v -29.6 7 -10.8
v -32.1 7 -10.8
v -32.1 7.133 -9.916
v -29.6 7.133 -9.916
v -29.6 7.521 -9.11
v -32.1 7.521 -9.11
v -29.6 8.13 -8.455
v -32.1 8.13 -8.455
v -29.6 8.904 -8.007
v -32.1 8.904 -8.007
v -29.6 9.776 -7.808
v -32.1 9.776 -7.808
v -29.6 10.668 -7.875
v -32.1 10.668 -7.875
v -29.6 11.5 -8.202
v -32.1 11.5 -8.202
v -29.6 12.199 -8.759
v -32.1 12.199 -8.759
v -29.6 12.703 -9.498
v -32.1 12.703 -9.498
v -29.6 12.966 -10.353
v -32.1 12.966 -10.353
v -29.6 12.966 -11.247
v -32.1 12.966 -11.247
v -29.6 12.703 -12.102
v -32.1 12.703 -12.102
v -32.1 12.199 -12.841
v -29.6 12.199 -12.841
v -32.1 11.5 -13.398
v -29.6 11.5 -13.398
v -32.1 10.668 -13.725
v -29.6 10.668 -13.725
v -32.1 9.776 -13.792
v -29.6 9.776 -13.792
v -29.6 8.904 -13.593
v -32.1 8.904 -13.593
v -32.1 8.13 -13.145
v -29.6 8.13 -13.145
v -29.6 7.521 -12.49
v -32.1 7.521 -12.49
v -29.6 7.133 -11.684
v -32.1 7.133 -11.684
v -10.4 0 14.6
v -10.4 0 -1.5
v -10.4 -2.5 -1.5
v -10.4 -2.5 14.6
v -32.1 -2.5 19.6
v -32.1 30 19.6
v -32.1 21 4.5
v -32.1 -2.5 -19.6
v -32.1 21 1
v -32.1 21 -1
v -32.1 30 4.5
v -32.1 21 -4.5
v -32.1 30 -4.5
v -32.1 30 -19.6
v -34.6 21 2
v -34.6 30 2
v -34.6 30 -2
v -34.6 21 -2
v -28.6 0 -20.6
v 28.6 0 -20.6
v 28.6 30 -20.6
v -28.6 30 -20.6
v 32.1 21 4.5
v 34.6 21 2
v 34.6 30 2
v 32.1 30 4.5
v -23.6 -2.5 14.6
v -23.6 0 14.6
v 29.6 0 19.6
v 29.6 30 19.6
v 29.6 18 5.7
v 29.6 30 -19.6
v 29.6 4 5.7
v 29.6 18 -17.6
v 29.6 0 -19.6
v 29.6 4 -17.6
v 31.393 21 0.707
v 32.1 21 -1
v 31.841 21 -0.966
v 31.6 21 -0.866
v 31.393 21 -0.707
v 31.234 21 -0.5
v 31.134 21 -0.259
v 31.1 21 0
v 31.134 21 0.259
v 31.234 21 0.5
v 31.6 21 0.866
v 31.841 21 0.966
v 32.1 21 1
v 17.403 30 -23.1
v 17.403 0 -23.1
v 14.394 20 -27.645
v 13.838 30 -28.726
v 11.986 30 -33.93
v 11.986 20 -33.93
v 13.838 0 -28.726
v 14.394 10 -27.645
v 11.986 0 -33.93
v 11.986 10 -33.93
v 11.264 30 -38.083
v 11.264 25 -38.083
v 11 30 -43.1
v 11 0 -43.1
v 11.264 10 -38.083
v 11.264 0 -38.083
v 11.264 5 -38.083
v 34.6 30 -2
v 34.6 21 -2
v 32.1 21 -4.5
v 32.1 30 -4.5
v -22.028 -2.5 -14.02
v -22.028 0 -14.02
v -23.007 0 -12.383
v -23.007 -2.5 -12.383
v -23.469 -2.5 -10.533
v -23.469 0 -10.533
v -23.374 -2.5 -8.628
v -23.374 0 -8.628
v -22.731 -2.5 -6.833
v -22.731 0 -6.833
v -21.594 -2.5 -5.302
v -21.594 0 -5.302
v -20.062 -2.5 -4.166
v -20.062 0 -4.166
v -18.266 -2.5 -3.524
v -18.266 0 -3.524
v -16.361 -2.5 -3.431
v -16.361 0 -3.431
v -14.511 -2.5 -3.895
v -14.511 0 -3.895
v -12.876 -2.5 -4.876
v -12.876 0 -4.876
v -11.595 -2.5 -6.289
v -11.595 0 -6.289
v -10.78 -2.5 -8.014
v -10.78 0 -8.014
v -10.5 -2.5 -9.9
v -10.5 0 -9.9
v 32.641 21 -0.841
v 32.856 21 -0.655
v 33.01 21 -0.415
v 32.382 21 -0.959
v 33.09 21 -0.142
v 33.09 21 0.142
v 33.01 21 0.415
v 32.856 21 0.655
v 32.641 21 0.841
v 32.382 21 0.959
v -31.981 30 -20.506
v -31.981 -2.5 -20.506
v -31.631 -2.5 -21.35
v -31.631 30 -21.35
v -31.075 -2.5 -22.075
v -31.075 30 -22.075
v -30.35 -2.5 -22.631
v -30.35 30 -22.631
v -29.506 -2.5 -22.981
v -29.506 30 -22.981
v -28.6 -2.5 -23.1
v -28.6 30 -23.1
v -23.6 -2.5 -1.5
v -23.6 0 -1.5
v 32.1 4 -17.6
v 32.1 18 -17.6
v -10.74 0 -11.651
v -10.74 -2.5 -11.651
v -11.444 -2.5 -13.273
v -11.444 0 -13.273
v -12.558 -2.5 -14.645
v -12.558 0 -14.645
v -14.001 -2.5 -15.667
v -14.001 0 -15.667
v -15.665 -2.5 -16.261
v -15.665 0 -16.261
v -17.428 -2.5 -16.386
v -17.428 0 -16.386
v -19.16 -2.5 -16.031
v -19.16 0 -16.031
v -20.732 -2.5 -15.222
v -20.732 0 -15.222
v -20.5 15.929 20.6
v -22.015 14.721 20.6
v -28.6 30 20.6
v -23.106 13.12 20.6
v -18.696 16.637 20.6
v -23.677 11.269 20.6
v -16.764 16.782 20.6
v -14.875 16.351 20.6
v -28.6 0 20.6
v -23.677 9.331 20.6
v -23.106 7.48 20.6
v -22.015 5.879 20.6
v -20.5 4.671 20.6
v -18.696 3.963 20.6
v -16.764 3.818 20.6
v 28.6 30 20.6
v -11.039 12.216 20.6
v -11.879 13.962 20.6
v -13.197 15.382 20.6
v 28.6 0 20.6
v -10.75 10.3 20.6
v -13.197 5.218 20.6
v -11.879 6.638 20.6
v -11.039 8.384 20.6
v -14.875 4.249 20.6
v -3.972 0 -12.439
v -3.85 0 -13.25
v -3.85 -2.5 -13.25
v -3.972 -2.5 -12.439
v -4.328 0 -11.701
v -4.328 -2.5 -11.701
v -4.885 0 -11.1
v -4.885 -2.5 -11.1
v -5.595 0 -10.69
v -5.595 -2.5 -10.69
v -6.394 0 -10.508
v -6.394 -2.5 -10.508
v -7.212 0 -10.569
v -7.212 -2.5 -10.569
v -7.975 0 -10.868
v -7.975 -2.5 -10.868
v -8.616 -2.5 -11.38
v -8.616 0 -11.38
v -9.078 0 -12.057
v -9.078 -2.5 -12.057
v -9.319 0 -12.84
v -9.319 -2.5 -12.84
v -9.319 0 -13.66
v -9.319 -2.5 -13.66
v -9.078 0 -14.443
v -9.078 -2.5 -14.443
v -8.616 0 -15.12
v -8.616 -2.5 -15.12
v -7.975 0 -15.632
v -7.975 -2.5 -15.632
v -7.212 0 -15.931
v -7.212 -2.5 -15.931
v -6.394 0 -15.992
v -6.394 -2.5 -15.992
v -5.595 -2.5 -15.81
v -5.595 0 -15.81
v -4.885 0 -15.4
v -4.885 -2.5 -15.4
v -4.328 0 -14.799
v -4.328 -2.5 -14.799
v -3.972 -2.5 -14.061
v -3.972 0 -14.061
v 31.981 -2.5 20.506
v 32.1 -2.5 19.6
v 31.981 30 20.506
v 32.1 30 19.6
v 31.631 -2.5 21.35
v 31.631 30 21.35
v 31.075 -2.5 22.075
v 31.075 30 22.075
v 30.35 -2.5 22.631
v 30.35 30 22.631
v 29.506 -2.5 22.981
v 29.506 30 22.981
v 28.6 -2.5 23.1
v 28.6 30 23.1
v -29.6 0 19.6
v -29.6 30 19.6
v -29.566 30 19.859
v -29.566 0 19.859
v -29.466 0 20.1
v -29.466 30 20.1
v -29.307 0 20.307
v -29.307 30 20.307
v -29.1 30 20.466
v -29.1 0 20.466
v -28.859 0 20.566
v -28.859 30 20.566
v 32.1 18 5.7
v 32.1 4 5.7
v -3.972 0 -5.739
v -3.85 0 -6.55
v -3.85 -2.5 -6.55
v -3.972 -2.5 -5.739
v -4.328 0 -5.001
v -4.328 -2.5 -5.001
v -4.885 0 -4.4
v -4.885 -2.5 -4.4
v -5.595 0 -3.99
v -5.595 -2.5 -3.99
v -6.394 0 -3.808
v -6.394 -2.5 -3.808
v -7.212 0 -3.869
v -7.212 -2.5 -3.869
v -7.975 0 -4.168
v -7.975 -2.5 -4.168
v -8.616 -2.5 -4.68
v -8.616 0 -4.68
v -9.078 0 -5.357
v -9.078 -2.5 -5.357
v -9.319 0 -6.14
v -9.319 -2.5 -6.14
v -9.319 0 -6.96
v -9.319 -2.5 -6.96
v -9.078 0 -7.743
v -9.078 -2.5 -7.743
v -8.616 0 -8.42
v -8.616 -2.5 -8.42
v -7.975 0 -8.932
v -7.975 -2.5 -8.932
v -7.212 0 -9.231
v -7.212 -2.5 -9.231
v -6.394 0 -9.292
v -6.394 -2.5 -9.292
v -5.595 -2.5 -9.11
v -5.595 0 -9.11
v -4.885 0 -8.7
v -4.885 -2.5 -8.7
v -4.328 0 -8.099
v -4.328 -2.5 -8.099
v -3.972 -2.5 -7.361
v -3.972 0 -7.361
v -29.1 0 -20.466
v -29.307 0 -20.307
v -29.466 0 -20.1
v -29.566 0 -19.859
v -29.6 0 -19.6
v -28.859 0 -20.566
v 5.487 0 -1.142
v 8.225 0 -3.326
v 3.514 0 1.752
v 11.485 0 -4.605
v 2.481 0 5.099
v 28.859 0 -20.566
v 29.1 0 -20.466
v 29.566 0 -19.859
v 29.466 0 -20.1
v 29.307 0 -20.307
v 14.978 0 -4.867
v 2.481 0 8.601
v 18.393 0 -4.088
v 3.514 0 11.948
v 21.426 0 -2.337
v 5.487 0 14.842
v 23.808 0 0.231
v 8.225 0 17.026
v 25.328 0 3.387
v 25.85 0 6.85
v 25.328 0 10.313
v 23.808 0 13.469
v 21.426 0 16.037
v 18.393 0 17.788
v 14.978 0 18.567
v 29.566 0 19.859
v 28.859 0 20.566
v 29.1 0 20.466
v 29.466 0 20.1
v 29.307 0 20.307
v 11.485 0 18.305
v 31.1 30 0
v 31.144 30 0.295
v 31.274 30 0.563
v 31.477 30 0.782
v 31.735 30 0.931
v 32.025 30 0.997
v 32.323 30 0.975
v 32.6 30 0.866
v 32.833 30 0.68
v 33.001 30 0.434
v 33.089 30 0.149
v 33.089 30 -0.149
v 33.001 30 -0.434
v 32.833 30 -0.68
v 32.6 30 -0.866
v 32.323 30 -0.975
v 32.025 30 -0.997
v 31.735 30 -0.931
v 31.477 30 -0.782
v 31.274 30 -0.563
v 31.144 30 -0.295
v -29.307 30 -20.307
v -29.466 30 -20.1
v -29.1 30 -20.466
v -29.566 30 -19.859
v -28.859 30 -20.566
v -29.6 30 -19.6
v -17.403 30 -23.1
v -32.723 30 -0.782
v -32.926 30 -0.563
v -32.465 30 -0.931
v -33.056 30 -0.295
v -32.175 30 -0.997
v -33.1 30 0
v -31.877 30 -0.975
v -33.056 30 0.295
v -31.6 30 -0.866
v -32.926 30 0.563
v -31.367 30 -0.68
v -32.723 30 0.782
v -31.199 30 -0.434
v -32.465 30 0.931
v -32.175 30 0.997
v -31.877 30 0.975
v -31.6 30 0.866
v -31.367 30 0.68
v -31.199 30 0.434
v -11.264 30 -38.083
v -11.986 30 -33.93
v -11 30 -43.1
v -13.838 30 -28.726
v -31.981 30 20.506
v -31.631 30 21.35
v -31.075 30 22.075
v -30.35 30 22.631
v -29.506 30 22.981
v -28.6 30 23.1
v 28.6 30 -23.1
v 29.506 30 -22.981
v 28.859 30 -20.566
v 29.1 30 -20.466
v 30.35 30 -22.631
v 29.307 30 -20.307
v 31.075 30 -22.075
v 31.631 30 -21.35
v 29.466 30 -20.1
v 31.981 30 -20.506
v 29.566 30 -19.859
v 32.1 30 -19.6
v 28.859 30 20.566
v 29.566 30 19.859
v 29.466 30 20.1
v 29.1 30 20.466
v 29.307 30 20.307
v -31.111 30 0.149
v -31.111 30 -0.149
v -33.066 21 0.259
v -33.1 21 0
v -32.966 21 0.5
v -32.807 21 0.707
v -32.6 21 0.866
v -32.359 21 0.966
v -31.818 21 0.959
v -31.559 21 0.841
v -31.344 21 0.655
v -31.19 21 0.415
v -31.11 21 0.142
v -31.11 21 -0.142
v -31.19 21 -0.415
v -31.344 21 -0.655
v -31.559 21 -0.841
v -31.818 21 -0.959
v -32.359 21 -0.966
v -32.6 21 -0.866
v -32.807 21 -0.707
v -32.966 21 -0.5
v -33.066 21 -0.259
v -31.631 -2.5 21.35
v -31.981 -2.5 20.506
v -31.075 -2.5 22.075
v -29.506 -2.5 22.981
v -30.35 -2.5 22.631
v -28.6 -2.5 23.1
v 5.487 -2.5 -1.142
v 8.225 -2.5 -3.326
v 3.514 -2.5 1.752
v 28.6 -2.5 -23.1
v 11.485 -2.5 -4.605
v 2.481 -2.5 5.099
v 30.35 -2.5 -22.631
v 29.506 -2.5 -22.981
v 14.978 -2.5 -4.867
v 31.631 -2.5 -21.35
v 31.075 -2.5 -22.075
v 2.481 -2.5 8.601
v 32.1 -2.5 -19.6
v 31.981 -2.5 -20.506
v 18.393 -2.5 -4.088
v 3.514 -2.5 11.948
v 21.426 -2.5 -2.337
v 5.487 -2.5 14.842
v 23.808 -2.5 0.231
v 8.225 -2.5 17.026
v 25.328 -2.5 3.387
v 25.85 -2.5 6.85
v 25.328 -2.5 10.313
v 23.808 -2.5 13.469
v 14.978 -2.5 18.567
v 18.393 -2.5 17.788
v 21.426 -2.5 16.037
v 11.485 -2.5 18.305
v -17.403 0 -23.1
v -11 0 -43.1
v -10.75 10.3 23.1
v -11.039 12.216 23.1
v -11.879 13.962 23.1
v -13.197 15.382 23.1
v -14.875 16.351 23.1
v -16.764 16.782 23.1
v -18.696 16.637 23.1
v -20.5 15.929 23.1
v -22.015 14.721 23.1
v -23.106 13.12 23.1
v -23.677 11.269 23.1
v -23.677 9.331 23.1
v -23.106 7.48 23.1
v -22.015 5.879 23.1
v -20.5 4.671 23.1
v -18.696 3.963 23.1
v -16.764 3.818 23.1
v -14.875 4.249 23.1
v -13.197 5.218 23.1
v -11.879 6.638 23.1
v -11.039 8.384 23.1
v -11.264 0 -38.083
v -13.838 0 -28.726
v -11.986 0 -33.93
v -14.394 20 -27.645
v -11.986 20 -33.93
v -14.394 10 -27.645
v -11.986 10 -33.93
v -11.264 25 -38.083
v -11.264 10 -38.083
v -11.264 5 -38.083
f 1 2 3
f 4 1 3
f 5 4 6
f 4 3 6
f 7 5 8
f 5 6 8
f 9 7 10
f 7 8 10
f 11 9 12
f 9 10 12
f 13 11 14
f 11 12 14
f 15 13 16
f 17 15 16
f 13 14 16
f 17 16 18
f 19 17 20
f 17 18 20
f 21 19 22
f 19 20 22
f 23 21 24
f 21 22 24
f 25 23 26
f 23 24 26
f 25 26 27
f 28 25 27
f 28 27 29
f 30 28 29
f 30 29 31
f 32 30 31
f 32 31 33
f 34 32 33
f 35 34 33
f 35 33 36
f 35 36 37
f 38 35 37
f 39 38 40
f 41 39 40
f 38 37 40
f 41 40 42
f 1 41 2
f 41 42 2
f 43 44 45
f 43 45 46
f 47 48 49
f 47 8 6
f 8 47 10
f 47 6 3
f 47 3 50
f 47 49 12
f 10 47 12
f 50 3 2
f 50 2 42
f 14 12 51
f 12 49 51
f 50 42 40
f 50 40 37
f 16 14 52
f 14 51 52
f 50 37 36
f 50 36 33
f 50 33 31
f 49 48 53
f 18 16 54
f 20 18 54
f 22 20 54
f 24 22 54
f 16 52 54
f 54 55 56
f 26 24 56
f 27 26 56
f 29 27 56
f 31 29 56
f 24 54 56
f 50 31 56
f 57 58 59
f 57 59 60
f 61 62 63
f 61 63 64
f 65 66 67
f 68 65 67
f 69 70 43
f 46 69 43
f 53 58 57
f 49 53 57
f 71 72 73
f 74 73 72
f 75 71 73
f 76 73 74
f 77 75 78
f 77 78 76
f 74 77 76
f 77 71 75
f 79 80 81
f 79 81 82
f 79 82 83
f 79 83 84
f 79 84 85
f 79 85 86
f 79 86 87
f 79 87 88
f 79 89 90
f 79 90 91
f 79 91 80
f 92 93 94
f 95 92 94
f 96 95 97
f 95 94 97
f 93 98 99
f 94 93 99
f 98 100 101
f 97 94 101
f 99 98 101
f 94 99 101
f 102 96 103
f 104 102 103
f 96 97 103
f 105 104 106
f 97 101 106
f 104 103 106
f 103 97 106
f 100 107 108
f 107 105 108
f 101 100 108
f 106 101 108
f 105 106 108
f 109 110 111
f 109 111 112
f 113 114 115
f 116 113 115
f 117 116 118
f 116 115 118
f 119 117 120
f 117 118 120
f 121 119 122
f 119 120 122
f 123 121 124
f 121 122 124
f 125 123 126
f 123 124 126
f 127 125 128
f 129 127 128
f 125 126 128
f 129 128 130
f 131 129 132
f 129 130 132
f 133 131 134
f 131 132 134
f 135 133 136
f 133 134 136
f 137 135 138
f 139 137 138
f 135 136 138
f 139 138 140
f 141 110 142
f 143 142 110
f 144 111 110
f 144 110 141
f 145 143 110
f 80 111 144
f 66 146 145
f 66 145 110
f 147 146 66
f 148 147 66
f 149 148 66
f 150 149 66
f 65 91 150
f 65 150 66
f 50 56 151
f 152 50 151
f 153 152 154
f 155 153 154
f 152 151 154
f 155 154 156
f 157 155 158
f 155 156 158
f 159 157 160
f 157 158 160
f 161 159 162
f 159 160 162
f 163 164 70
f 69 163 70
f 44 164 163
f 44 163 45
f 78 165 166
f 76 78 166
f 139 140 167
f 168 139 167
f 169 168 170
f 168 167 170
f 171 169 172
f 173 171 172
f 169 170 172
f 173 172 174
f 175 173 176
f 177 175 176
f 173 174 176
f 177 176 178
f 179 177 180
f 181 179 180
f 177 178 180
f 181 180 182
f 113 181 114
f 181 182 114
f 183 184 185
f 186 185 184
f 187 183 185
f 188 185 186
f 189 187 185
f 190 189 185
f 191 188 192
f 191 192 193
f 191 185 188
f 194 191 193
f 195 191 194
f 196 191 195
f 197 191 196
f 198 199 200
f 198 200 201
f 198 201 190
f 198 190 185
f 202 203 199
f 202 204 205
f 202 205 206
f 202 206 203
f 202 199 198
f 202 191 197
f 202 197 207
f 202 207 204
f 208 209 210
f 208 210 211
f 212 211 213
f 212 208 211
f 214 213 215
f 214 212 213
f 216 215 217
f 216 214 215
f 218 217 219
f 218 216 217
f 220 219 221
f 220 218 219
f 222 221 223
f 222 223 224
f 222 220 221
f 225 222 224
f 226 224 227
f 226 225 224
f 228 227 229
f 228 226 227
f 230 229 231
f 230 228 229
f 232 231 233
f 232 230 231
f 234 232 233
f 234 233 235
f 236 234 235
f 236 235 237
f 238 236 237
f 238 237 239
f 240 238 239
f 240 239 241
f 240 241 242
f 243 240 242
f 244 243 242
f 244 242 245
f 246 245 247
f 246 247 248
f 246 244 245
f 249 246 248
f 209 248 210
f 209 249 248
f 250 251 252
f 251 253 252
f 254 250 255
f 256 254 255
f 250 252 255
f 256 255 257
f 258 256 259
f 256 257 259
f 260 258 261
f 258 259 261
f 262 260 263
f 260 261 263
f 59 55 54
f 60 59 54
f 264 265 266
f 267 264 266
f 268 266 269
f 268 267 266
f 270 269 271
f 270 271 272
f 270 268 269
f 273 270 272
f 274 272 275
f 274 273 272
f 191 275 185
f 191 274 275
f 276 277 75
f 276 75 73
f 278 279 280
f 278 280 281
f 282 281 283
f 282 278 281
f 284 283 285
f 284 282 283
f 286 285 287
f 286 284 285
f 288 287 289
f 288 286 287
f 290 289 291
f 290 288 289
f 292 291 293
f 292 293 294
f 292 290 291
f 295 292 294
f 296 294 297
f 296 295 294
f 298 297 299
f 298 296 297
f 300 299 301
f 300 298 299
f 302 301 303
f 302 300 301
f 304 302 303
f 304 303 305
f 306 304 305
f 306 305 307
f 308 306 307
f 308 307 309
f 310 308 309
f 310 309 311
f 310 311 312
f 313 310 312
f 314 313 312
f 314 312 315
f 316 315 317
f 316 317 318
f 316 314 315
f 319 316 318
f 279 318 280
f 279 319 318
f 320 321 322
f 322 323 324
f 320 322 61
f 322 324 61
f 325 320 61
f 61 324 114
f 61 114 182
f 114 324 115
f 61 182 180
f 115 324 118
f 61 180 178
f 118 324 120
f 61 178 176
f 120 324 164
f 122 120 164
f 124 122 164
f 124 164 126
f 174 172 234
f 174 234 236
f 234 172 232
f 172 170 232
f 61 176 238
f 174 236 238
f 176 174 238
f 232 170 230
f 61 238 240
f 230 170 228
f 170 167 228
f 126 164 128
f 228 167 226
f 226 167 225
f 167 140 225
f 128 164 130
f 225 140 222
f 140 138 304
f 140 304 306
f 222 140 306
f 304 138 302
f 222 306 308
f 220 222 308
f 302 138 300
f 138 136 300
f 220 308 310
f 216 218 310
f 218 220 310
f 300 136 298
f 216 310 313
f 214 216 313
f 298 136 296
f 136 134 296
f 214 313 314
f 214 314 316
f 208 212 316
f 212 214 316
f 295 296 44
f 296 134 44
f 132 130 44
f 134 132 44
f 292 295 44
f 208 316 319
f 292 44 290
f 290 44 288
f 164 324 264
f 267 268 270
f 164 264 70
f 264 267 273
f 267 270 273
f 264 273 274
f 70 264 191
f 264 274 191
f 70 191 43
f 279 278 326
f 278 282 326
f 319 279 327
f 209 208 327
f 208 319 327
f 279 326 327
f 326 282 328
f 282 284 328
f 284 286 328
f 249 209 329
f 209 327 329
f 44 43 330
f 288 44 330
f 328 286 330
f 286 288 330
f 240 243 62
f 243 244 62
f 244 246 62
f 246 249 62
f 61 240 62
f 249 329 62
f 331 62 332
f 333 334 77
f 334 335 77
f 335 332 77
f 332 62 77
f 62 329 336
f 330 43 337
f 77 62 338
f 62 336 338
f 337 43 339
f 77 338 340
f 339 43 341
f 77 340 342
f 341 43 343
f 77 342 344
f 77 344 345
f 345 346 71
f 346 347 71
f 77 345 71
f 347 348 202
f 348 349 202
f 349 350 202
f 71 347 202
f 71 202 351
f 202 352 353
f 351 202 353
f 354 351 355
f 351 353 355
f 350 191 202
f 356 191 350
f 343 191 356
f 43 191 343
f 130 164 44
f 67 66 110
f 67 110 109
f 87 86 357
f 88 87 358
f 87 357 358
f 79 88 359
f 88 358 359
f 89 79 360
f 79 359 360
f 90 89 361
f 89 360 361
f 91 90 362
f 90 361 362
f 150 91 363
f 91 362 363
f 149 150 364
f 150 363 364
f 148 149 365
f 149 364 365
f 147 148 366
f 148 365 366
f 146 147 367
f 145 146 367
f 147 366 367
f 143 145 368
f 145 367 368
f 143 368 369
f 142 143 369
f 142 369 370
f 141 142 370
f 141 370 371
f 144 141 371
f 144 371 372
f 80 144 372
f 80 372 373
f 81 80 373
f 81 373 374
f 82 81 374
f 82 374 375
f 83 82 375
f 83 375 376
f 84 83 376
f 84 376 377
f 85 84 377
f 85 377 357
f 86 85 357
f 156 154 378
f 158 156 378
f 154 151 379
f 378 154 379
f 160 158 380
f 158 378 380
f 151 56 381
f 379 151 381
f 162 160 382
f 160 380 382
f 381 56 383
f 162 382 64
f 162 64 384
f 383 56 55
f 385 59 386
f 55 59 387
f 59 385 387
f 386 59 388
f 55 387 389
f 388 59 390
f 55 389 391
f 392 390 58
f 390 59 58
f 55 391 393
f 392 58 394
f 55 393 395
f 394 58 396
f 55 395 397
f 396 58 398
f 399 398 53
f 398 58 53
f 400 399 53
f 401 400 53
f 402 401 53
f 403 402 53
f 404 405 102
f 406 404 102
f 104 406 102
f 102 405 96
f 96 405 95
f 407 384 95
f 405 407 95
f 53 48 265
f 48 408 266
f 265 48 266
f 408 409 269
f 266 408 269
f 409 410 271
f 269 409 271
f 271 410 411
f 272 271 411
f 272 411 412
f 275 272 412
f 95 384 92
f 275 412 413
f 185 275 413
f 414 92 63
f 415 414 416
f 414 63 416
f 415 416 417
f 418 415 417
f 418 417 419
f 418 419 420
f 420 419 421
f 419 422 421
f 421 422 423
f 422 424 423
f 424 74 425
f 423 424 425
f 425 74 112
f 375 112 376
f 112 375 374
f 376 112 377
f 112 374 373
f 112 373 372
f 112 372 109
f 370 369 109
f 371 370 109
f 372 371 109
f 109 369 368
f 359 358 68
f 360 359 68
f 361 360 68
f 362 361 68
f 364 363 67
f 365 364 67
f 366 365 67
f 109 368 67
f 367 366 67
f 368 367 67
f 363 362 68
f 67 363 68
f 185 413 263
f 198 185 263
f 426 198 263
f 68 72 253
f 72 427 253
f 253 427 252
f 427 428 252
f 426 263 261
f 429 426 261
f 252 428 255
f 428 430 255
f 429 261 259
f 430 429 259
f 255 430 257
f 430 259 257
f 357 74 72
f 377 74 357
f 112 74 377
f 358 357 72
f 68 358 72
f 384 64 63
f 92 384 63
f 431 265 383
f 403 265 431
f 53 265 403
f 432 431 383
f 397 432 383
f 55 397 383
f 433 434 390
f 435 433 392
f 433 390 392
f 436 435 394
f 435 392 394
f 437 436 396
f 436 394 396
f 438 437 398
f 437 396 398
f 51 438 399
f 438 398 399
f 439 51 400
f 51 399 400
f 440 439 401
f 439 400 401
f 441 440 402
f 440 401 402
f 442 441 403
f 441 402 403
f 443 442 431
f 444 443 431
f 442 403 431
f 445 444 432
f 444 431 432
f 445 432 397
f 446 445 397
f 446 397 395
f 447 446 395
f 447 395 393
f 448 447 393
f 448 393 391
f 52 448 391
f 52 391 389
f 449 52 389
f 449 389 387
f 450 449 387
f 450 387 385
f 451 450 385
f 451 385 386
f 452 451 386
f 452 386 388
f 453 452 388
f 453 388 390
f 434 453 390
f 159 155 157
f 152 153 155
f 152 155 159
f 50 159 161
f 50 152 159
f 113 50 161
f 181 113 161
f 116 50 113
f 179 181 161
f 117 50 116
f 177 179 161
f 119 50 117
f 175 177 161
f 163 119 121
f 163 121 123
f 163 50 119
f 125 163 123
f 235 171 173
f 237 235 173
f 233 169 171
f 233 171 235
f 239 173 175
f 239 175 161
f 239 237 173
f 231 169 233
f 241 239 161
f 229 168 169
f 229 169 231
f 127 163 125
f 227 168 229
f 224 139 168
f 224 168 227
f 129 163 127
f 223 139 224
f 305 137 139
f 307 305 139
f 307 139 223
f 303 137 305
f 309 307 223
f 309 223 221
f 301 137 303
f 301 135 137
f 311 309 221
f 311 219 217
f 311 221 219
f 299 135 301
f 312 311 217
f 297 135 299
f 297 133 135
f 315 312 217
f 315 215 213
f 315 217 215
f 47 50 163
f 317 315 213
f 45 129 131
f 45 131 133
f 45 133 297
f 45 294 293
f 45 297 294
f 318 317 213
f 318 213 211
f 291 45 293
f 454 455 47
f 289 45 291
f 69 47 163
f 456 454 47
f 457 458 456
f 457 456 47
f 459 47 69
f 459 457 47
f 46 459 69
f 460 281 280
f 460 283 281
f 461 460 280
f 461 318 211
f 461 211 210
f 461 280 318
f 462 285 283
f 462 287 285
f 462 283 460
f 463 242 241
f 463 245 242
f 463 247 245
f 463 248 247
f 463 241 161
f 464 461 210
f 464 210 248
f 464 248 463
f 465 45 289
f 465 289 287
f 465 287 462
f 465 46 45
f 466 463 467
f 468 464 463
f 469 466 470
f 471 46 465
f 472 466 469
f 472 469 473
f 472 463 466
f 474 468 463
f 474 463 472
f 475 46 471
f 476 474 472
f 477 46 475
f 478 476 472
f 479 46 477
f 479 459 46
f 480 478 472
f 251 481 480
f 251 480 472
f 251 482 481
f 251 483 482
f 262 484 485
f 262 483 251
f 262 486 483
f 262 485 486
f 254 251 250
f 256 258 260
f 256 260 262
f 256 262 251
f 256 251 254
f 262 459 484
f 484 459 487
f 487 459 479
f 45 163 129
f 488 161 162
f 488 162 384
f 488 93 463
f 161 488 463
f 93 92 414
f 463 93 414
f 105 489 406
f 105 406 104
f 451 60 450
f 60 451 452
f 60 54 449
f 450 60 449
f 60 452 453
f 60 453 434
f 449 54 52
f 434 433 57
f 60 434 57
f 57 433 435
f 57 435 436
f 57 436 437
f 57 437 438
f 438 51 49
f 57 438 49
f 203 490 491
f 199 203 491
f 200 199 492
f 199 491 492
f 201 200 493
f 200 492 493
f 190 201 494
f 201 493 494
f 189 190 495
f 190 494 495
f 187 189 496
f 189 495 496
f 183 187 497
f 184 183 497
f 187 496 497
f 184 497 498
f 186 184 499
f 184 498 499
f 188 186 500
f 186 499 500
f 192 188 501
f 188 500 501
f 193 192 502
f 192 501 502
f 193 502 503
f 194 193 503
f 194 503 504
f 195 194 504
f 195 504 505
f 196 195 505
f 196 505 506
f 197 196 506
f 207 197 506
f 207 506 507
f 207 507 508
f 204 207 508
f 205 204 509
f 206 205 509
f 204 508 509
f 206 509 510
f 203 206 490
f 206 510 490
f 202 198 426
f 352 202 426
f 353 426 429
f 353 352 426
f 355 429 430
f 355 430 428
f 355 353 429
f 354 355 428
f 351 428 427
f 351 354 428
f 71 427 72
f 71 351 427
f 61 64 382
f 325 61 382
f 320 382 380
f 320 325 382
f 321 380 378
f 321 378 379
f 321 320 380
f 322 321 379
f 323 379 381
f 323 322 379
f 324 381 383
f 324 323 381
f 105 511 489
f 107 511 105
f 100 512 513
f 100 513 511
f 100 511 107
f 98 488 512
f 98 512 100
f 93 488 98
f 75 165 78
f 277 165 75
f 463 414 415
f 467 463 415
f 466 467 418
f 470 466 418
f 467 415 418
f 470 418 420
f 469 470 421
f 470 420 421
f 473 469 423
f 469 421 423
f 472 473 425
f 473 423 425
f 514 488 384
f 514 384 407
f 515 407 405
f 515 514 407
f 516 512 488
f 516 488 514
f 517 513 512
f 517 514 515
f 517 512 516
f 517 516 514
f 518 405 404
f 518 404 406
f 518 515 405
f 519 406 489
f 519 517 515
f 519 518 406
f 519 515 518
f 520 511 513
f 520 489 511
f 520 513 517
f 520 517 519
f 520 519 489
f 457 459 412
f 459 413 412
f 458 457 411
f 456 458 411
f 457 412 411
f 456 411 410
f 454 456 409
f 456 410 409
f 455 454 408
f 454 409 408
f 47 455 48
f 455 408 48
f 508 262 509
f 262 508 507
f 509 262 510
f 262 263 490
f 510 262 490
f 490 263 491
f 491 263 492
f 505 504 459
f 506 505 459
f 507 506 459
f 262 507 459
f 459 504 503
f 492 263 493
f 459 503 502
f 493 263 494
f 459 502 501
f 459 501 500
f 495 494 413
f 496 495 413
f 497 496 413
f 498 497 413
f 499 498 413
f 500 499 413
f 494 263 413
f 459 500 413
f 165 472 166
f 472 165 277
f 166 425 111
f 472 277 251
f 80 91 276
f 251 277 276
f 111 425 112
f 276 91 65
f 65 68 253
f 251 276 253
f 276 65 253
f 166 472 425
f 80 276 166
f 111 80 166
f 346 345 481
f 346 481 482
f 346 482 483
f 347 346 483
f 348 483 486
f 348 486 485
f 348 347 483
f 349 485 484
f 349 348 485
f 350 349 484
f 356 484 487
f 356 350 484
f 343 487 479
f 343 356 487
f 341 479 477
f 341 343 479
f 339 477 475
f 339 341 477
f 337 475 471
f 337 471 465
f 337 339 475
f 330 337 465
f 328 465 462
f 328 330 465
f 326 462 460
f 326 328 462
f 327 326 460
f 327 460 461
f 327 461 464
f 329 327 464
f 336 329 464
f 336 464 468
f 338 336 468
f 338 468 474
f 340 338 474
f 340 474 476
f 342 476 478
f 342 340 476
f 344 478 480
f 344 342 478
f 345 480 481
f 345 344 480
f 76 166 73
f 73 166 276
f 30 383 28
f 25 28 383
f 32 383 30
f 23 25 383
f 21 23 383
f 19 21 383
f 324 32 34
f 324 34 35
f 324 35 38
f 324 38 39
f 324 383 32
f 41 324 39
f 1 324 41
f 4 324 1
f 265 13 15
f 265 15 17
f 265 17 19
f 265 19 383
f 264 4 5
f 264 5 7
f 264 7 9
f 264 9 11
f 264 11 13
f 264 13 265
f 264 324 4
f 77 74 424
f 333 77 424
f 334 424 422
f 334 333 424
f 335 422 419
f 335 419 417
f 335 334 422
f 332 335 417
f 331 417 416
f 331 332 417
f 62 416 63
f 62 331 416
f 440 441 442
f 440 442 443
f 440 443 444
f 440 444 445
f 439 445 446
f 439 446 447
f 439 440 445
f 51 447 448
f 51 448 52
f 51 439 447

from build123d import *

# Parameters (mm, degrees)
F1_DEPTH  = 30
F0_R      = 2.75
F0_W      = 13.2
F0_H      = 16.1
F0_R_2    = 11.75
F2_DEPTH  = 2.5
F3_R      = 6.5
F4_DEPTH  = 2.5
F5_R      = 3
F6_DEPTH  = 2.5
F7_W      = 14
F7_H      = 23.3
F8_DEPTH  = 2.5
F5_W      = 9
F5_H      = 9
F9_DEPTH  = 2.5
F7_W_2    = 9
F7_H_2    = 9
F10_DEPTH = 2.5
F11_SIZE  = 2.49999
F12_R     = 1
F13_DEPTH = 9


# Not quite as in the source:
# - a fillet or chamfer is up to 0.001 mm smaller than in the source, because OpenCascade refuses the exact size


with BuildPart() as f1:
    # F0 (on Front) → F1 (new body)
    with BuildSketch(Plane.XZ):
        with BuildLine():
            Line((-28.6, 20.6), (28.6, 20.6))
            ThreePointArc((28.6, 20.6), (29.3071067812, 20.3071067812), (29.6, 19.6))
            Line((29.6, 19.6), (29.6, -19.6))
            ThreePointArc((29.6, -19.6), (29.3071067812, -20.3071067812), (28.6, -20.6))
            Line((28.6, -20.6), (19.2463447419, -20.6))
            add(Edge.make_bspline(
                [(19.2463447419, -20.6), (18.6700440776, -21.4257741259), (18.043869698, -22.2429184725), (17.402758481, -23.1)],
                knots=[11.0100107819, 11.0100107819, 11.0100107819, 11.0100107819, 14.8362531821, 14.8362531821, 14.8362531821, 14.8362531821], degree=3))
            Line((17.402758481, -23.1), (28.6, -23.1))
            ThreePointArc((28.6, -23.1), (31.0748737342, -22.0748737342), (32.1, -19.6))
            Line((32.1, -19.6), (32.1, 19.6))
            ThreePointArc((32.1, 19.6), (31.0748737342, 22.0748737342), (28.6, 23.1))
            Line((28.6, 23.1), (-28.6, 23.1))
            ThreePointArc((-28.6, 23.1), (-31.0748737342, 22.0748737342), (-32.1, 19.6))
            Line((-32.1, 19.6), (-32.1, -19.6))
            ThreePointArc((-32.1, -19.6), (-31.0748737342, -22.0748737342), (-28.6, -23.1))
            Line((-28.6, -23.1), (-17.402758481, -23.1))
            add(Edge.make_bspline(
                [(-19.2463447419, -20.6), (-18.6700440776, -21.4257741259), (-18.043869698, -22.2429184725), (-17.402758481, -23.1)],
                knots=[11.0100107819, 11.0100107819, 11.0100107819, 11.0100107819, 14.8362531821, 14.8362531821, 14.8362531821, 14.8362531821], degree=3))
            Line((-19.2463447419, -20.6), (-28.6, -20.6))
            ThreePointArc((-28.6, -20.6), (-29.3071067812, -20.3071067812), (-29.6, -19.6))
            Line((-29.6, -19.6), (-29.6, 19.6))
            ThreePointArc((-29.6, 19.6), (-29.3071067812, 20.3071067812), (-28.6, 20.6))
        make_face()
        with BuildLine():
            add(Edge.make_bspline(
                [(19.2463447419, -20.6), (18.6700440776, -21.4257741259), (18.043869698, -22.2429184725), (17.402758481, -23.1)],
                knots=[11.0100107819, 11.0100107819, 11.0100107819, 11.0100107819, 14.8362531821, 14.8362531821, 14.8362531821, 14.8362531821], degree=3))
            Line((19.2463447419, -20.6), (-19.2463447419, -20.6))
            add(Edge.make_bspline(
                [(-19.2463447419, -20.6), (-18.6700440776, -21.4257741259), (-18.043869698, -22.2429184725), (-17.402758481, -23.1)],
                knots=[11.0100107819, 11.0100107819, 11.0100107819, 11.0100107819, 14.8362531821, 14.8362531821, 14.8362531821, 14.8362531821], degree=3))
            Line((-17.402758481, -23.1), (17.402758481, -23.1))
        make_face()
        with BuildLine():
            add(Edge.make_bspline(
                [(17.402758481, -23.1), (14.3686514172, -27.1562028058), (11, -32.1068893696), (11, -43.1)],
                knots=[14.8362531821, 14.8362531821, 14.8362531821, 14.8362531821, 32.9442331828, 32.9442331828, 32.9442331828, 32.9442331828], degree=3))
            Line((17.402758481, -23.1), (-17.402758481, -23.1))
            add(Edge.make_bspline(
                [(-17.402758481, -23.1), (-14.3686514172, -27.1562028058), (-11, -32.1068893696), (-11, -43.1)],
                knots=[14.8362531821, 14.8362531821, 14.8362531821, 14.8362531821, 32.9442331828, 32.9442331828, 32.9442331828, 32.9442331828], degree=3))
            Line((-11, -43.1), (11, -43.1))
        make_face()
    extrude(amount=-F1_DEPTH)

    # F0 (on Front) → F2 (join)
    with BuildSketch(Plane.XZ):
        with BuildLine():
            Line((-28.6, 20.6), (28.6, 20.6))
            ThreePointArc((28.6, 20.6), (29.3071067812, 20.3071067812), (29.6, 19.6))
            Line((29.6, 19.6), (29.6, -19.6))
            ThreePointArc((29.6, -19.6), (29.3071067812, -20.3071067812), (28.6, -20.6))
            Line((28.6, -20.6), (19.2463447419, -20.6))
            add(Edge.make_bspline(
                [(19.2463447419, -20.6), (18.6700440776, -21.4257741259), (18.043869698, -22.2429184725), (17.402758481, -23.1)],
                knots=[11.0100107819, 11.0100107819, 11.0100107819, 11.0100107819, 14.8362531821, 14.8362531821, 14.8362531821, 14.8362531821], degree=3))
            Line((17.402758481, -23.1), (28.6, -23.1))
            ThreePointArc((28.6, -23.1), (31.0748737342, -22.0748737342), (32.1, -19.6))
            Line((32.1, -19.6), (32.1, 19.6))
            ThreePointArc((32.1, 19.6), (31.0748737342, 22.0748737342), (28.6, 23.1))
            Line((28.6, 23.1), (-28.6, 23.1))
            ThreePointArc((-28.6, 23.1), (-31.0748737342, 22.0748737342), (-32.1, 19.6))
            Line((-32.1, 19.6), (-32.1, -19.6))
            ThreePointArc((-32.1, -19.6), (-31.0748737342, -22.0748737342), (-28.6, -23.1))
            Line((-28.6, -23.1), (-17.402758481, -23.1))
            add(Edge.make_bspline(
                [(-19.2463447419, -20.6), (-18.6700440776, -21.4257741259), (-18.043869698, -22.2429184725), (-17.402758481, -23.1)],
                knots=[11.0100107819, 11.0100107819, 11.0100107819, 11.0100107819, 14.8362531821, 14.8362531821, 14.8362531821, 14.8362531821], degree=3))
            Line((-19.2463447419, -20.6), (-28.6, -20.6))
            ThreePointArc((-28.6, -20.6), (-29.3071067812, -20.3071067812), (-29.6, -19.6))
            Line((-29.6, -19.6), (-29.6, 19.6))
            ThreePointArc((-29.6, 19.6), (-29.3071067812, 20.3071067812), (-28.6, 20.6))
        make_face()
        with BuildLine():
            ThreePointArc((29.6, 19.6), (29.3071067812, 20.3071067812), (28.6, 20.6))
            Line((28.6, 20.6), (-28.6, 20.6))
            ThreePointArc((-28.6, 20.6), (-29.3071067812, 20.3071067812), (-29.6, 19.6))
            Line((-29.6, 19.6), (-29.6, -19.6))
            ThreePointArc((-29.6, -19.6), (-29.3071067812, -20.3071067812), (-28.6, -20.6))
            Line((-28.6, -20.6), (-19.2463447419, -20.6))
            Line((-19.2463447419, -20.6), (19.2463447419, -20.6))
            Line((19.2463447419, -20.6), (28.6, -20.6))
            ThreePointArc((28.6, -20.6), (29.3071067812, -20.3071067812), (29.6, -19.6))
            Line((29.6, -19.6), (29.6, 19.6))
        make_face()
        with Locations((-6.6, -13.25)):
            Circle(F0_R, mode=Mode.SUBTRACT)
        with BuildLine():
            ThreePointArc((-10.5, -9.9), (-14.8124838728, -16.0208474244), (-22.027622521, -14.019831524))
            ThreePointArc((-22.027622521, -14.019831524), (-19.1875161272, -3.7791525756), (-10.5, -9.9))
        make_face(mode=Mode.SUBTRACT)
        with Locations((-17, 6.55)):
            Rectangle(F0_W, F0_H, mode=Mode.SUBTRACT)
        with Locations((-6.6, -6.55)):
            Circle(F0_R, mode=Mode.SUBTRACT)
        with Locations((14.1, 6.85)):
            Circle(F0_R_2, mode=Mode.SUBTRACT)
        with BuildLine():
            add(Edge.make_bspline(
                [(19.2463447419, -20.6), (18.6700440776, -21.4257741259), (18.043869698, -22.2429184725), (17.402758481, -23.1)],
                knots=[11.0100107819, 11.0100107819, 11.0100107819, 11.0100107819, 14.8362531821, 14.8362531821, 14.8362531821, 14.8362531821], degree=3))
            Line((19.2463447419, -20.6), (-19.2463447419, -20.6))
            add(Edge.make_bspline(
                [(-19.2463447419, -20.6), (-18.6700440776, -21.4257741259), (-18.043869698, -22.2429184725), (-17.402758481, -23.1)],
                knots=[11.0100107819, 11.0100107819, 11.0100107819, 11.0100107819, 14.8362531821, 14.8362531821, 14.8362531821, 14.8362531821], degree=3))
            Line((-17.402758481, -23.1), (17.402758481, -23.1))
        make_face()
    extrude(amount=F2_DEPTH)

    # F3 (on face) → F4 (cut, through all)
    with BuildSketch(Plane.XY.offset(23.1)):
        with Locations((-17.25, 10.3)):
            Circle(F3_R)
    extrude(amount=-F4_DEPTH, mode=Mode.SUBTRACT)

    # F5 (on face) → F6 (cut, through all)
    with BuildSketch(Plane(origin=(-32.1, 0, 0), x_dir=(0, -1, 0), z_dir=(-1, 0, 0))):
        with Locations((-10, -10.8)):
            Circle(F5_R)
    extrude(amount=-F6_DEPTH, mode=Mode.SUBTRACT)

    # F7 (on face) → F8 (cut, through all)
    with BuildSketch(Plane.YZ.offset(32.1)):
        with Locations((11, -5.95)):
            Rectangle(F7_W, F7_H)
    extrude(amount=-F8_DEPTH, mode=Mode.SUBTRACT)

    # F5 (on face) → F9 (join)
    with BuildSketch(Plane(origin=(-32.1, 0, 0), x_dir=(0, -1, 0), z_dir=(-1, 0, 0))):
        with Locations((-25.5, 0)):
            Rectangle(F5_W, F5_H)
    extrude(amount=F9_DEPTH)

    # F7 (on face) → F10 (join)
    with BuildSketch(Plane.YZ.offset(32.1)):
        with Locations((25.5, 0)):
            Rectangle(F7_W_2, F7_H_2)
    extrude(amount=F10_DEPTH)

    # F11 (size 2.5 in the source; OpenCascade refuses exactly that, so slightly less here)
    f11_edges = [f1.edges().sort_by_distance(p)[0] for p in [
        (-34.6, 25.5, -4.5),
        (-34.6, 25.5, 4.5),
        (34.6, 25.5, 4.5),
        (34.6, 25.5, -4.5),
    ]]
    chamfer(f11_edges, length=F11_SIZE)

    # F12 (on face) → F13 (cut)
    with BuildSketch(Plane(origin=(0, 30, 0), x_dir=(-1, 0, 0), z_dir=(0, 1, 0))):
        with Locations((-32.1, 0)):
            Circle(F12_R)
        with Locations((32.1, 0)):
            Circle(F12_R)
    extrude(amount=-F13_DEPTH, mode=Mode.SUBTRACT)


solid = f1.part
